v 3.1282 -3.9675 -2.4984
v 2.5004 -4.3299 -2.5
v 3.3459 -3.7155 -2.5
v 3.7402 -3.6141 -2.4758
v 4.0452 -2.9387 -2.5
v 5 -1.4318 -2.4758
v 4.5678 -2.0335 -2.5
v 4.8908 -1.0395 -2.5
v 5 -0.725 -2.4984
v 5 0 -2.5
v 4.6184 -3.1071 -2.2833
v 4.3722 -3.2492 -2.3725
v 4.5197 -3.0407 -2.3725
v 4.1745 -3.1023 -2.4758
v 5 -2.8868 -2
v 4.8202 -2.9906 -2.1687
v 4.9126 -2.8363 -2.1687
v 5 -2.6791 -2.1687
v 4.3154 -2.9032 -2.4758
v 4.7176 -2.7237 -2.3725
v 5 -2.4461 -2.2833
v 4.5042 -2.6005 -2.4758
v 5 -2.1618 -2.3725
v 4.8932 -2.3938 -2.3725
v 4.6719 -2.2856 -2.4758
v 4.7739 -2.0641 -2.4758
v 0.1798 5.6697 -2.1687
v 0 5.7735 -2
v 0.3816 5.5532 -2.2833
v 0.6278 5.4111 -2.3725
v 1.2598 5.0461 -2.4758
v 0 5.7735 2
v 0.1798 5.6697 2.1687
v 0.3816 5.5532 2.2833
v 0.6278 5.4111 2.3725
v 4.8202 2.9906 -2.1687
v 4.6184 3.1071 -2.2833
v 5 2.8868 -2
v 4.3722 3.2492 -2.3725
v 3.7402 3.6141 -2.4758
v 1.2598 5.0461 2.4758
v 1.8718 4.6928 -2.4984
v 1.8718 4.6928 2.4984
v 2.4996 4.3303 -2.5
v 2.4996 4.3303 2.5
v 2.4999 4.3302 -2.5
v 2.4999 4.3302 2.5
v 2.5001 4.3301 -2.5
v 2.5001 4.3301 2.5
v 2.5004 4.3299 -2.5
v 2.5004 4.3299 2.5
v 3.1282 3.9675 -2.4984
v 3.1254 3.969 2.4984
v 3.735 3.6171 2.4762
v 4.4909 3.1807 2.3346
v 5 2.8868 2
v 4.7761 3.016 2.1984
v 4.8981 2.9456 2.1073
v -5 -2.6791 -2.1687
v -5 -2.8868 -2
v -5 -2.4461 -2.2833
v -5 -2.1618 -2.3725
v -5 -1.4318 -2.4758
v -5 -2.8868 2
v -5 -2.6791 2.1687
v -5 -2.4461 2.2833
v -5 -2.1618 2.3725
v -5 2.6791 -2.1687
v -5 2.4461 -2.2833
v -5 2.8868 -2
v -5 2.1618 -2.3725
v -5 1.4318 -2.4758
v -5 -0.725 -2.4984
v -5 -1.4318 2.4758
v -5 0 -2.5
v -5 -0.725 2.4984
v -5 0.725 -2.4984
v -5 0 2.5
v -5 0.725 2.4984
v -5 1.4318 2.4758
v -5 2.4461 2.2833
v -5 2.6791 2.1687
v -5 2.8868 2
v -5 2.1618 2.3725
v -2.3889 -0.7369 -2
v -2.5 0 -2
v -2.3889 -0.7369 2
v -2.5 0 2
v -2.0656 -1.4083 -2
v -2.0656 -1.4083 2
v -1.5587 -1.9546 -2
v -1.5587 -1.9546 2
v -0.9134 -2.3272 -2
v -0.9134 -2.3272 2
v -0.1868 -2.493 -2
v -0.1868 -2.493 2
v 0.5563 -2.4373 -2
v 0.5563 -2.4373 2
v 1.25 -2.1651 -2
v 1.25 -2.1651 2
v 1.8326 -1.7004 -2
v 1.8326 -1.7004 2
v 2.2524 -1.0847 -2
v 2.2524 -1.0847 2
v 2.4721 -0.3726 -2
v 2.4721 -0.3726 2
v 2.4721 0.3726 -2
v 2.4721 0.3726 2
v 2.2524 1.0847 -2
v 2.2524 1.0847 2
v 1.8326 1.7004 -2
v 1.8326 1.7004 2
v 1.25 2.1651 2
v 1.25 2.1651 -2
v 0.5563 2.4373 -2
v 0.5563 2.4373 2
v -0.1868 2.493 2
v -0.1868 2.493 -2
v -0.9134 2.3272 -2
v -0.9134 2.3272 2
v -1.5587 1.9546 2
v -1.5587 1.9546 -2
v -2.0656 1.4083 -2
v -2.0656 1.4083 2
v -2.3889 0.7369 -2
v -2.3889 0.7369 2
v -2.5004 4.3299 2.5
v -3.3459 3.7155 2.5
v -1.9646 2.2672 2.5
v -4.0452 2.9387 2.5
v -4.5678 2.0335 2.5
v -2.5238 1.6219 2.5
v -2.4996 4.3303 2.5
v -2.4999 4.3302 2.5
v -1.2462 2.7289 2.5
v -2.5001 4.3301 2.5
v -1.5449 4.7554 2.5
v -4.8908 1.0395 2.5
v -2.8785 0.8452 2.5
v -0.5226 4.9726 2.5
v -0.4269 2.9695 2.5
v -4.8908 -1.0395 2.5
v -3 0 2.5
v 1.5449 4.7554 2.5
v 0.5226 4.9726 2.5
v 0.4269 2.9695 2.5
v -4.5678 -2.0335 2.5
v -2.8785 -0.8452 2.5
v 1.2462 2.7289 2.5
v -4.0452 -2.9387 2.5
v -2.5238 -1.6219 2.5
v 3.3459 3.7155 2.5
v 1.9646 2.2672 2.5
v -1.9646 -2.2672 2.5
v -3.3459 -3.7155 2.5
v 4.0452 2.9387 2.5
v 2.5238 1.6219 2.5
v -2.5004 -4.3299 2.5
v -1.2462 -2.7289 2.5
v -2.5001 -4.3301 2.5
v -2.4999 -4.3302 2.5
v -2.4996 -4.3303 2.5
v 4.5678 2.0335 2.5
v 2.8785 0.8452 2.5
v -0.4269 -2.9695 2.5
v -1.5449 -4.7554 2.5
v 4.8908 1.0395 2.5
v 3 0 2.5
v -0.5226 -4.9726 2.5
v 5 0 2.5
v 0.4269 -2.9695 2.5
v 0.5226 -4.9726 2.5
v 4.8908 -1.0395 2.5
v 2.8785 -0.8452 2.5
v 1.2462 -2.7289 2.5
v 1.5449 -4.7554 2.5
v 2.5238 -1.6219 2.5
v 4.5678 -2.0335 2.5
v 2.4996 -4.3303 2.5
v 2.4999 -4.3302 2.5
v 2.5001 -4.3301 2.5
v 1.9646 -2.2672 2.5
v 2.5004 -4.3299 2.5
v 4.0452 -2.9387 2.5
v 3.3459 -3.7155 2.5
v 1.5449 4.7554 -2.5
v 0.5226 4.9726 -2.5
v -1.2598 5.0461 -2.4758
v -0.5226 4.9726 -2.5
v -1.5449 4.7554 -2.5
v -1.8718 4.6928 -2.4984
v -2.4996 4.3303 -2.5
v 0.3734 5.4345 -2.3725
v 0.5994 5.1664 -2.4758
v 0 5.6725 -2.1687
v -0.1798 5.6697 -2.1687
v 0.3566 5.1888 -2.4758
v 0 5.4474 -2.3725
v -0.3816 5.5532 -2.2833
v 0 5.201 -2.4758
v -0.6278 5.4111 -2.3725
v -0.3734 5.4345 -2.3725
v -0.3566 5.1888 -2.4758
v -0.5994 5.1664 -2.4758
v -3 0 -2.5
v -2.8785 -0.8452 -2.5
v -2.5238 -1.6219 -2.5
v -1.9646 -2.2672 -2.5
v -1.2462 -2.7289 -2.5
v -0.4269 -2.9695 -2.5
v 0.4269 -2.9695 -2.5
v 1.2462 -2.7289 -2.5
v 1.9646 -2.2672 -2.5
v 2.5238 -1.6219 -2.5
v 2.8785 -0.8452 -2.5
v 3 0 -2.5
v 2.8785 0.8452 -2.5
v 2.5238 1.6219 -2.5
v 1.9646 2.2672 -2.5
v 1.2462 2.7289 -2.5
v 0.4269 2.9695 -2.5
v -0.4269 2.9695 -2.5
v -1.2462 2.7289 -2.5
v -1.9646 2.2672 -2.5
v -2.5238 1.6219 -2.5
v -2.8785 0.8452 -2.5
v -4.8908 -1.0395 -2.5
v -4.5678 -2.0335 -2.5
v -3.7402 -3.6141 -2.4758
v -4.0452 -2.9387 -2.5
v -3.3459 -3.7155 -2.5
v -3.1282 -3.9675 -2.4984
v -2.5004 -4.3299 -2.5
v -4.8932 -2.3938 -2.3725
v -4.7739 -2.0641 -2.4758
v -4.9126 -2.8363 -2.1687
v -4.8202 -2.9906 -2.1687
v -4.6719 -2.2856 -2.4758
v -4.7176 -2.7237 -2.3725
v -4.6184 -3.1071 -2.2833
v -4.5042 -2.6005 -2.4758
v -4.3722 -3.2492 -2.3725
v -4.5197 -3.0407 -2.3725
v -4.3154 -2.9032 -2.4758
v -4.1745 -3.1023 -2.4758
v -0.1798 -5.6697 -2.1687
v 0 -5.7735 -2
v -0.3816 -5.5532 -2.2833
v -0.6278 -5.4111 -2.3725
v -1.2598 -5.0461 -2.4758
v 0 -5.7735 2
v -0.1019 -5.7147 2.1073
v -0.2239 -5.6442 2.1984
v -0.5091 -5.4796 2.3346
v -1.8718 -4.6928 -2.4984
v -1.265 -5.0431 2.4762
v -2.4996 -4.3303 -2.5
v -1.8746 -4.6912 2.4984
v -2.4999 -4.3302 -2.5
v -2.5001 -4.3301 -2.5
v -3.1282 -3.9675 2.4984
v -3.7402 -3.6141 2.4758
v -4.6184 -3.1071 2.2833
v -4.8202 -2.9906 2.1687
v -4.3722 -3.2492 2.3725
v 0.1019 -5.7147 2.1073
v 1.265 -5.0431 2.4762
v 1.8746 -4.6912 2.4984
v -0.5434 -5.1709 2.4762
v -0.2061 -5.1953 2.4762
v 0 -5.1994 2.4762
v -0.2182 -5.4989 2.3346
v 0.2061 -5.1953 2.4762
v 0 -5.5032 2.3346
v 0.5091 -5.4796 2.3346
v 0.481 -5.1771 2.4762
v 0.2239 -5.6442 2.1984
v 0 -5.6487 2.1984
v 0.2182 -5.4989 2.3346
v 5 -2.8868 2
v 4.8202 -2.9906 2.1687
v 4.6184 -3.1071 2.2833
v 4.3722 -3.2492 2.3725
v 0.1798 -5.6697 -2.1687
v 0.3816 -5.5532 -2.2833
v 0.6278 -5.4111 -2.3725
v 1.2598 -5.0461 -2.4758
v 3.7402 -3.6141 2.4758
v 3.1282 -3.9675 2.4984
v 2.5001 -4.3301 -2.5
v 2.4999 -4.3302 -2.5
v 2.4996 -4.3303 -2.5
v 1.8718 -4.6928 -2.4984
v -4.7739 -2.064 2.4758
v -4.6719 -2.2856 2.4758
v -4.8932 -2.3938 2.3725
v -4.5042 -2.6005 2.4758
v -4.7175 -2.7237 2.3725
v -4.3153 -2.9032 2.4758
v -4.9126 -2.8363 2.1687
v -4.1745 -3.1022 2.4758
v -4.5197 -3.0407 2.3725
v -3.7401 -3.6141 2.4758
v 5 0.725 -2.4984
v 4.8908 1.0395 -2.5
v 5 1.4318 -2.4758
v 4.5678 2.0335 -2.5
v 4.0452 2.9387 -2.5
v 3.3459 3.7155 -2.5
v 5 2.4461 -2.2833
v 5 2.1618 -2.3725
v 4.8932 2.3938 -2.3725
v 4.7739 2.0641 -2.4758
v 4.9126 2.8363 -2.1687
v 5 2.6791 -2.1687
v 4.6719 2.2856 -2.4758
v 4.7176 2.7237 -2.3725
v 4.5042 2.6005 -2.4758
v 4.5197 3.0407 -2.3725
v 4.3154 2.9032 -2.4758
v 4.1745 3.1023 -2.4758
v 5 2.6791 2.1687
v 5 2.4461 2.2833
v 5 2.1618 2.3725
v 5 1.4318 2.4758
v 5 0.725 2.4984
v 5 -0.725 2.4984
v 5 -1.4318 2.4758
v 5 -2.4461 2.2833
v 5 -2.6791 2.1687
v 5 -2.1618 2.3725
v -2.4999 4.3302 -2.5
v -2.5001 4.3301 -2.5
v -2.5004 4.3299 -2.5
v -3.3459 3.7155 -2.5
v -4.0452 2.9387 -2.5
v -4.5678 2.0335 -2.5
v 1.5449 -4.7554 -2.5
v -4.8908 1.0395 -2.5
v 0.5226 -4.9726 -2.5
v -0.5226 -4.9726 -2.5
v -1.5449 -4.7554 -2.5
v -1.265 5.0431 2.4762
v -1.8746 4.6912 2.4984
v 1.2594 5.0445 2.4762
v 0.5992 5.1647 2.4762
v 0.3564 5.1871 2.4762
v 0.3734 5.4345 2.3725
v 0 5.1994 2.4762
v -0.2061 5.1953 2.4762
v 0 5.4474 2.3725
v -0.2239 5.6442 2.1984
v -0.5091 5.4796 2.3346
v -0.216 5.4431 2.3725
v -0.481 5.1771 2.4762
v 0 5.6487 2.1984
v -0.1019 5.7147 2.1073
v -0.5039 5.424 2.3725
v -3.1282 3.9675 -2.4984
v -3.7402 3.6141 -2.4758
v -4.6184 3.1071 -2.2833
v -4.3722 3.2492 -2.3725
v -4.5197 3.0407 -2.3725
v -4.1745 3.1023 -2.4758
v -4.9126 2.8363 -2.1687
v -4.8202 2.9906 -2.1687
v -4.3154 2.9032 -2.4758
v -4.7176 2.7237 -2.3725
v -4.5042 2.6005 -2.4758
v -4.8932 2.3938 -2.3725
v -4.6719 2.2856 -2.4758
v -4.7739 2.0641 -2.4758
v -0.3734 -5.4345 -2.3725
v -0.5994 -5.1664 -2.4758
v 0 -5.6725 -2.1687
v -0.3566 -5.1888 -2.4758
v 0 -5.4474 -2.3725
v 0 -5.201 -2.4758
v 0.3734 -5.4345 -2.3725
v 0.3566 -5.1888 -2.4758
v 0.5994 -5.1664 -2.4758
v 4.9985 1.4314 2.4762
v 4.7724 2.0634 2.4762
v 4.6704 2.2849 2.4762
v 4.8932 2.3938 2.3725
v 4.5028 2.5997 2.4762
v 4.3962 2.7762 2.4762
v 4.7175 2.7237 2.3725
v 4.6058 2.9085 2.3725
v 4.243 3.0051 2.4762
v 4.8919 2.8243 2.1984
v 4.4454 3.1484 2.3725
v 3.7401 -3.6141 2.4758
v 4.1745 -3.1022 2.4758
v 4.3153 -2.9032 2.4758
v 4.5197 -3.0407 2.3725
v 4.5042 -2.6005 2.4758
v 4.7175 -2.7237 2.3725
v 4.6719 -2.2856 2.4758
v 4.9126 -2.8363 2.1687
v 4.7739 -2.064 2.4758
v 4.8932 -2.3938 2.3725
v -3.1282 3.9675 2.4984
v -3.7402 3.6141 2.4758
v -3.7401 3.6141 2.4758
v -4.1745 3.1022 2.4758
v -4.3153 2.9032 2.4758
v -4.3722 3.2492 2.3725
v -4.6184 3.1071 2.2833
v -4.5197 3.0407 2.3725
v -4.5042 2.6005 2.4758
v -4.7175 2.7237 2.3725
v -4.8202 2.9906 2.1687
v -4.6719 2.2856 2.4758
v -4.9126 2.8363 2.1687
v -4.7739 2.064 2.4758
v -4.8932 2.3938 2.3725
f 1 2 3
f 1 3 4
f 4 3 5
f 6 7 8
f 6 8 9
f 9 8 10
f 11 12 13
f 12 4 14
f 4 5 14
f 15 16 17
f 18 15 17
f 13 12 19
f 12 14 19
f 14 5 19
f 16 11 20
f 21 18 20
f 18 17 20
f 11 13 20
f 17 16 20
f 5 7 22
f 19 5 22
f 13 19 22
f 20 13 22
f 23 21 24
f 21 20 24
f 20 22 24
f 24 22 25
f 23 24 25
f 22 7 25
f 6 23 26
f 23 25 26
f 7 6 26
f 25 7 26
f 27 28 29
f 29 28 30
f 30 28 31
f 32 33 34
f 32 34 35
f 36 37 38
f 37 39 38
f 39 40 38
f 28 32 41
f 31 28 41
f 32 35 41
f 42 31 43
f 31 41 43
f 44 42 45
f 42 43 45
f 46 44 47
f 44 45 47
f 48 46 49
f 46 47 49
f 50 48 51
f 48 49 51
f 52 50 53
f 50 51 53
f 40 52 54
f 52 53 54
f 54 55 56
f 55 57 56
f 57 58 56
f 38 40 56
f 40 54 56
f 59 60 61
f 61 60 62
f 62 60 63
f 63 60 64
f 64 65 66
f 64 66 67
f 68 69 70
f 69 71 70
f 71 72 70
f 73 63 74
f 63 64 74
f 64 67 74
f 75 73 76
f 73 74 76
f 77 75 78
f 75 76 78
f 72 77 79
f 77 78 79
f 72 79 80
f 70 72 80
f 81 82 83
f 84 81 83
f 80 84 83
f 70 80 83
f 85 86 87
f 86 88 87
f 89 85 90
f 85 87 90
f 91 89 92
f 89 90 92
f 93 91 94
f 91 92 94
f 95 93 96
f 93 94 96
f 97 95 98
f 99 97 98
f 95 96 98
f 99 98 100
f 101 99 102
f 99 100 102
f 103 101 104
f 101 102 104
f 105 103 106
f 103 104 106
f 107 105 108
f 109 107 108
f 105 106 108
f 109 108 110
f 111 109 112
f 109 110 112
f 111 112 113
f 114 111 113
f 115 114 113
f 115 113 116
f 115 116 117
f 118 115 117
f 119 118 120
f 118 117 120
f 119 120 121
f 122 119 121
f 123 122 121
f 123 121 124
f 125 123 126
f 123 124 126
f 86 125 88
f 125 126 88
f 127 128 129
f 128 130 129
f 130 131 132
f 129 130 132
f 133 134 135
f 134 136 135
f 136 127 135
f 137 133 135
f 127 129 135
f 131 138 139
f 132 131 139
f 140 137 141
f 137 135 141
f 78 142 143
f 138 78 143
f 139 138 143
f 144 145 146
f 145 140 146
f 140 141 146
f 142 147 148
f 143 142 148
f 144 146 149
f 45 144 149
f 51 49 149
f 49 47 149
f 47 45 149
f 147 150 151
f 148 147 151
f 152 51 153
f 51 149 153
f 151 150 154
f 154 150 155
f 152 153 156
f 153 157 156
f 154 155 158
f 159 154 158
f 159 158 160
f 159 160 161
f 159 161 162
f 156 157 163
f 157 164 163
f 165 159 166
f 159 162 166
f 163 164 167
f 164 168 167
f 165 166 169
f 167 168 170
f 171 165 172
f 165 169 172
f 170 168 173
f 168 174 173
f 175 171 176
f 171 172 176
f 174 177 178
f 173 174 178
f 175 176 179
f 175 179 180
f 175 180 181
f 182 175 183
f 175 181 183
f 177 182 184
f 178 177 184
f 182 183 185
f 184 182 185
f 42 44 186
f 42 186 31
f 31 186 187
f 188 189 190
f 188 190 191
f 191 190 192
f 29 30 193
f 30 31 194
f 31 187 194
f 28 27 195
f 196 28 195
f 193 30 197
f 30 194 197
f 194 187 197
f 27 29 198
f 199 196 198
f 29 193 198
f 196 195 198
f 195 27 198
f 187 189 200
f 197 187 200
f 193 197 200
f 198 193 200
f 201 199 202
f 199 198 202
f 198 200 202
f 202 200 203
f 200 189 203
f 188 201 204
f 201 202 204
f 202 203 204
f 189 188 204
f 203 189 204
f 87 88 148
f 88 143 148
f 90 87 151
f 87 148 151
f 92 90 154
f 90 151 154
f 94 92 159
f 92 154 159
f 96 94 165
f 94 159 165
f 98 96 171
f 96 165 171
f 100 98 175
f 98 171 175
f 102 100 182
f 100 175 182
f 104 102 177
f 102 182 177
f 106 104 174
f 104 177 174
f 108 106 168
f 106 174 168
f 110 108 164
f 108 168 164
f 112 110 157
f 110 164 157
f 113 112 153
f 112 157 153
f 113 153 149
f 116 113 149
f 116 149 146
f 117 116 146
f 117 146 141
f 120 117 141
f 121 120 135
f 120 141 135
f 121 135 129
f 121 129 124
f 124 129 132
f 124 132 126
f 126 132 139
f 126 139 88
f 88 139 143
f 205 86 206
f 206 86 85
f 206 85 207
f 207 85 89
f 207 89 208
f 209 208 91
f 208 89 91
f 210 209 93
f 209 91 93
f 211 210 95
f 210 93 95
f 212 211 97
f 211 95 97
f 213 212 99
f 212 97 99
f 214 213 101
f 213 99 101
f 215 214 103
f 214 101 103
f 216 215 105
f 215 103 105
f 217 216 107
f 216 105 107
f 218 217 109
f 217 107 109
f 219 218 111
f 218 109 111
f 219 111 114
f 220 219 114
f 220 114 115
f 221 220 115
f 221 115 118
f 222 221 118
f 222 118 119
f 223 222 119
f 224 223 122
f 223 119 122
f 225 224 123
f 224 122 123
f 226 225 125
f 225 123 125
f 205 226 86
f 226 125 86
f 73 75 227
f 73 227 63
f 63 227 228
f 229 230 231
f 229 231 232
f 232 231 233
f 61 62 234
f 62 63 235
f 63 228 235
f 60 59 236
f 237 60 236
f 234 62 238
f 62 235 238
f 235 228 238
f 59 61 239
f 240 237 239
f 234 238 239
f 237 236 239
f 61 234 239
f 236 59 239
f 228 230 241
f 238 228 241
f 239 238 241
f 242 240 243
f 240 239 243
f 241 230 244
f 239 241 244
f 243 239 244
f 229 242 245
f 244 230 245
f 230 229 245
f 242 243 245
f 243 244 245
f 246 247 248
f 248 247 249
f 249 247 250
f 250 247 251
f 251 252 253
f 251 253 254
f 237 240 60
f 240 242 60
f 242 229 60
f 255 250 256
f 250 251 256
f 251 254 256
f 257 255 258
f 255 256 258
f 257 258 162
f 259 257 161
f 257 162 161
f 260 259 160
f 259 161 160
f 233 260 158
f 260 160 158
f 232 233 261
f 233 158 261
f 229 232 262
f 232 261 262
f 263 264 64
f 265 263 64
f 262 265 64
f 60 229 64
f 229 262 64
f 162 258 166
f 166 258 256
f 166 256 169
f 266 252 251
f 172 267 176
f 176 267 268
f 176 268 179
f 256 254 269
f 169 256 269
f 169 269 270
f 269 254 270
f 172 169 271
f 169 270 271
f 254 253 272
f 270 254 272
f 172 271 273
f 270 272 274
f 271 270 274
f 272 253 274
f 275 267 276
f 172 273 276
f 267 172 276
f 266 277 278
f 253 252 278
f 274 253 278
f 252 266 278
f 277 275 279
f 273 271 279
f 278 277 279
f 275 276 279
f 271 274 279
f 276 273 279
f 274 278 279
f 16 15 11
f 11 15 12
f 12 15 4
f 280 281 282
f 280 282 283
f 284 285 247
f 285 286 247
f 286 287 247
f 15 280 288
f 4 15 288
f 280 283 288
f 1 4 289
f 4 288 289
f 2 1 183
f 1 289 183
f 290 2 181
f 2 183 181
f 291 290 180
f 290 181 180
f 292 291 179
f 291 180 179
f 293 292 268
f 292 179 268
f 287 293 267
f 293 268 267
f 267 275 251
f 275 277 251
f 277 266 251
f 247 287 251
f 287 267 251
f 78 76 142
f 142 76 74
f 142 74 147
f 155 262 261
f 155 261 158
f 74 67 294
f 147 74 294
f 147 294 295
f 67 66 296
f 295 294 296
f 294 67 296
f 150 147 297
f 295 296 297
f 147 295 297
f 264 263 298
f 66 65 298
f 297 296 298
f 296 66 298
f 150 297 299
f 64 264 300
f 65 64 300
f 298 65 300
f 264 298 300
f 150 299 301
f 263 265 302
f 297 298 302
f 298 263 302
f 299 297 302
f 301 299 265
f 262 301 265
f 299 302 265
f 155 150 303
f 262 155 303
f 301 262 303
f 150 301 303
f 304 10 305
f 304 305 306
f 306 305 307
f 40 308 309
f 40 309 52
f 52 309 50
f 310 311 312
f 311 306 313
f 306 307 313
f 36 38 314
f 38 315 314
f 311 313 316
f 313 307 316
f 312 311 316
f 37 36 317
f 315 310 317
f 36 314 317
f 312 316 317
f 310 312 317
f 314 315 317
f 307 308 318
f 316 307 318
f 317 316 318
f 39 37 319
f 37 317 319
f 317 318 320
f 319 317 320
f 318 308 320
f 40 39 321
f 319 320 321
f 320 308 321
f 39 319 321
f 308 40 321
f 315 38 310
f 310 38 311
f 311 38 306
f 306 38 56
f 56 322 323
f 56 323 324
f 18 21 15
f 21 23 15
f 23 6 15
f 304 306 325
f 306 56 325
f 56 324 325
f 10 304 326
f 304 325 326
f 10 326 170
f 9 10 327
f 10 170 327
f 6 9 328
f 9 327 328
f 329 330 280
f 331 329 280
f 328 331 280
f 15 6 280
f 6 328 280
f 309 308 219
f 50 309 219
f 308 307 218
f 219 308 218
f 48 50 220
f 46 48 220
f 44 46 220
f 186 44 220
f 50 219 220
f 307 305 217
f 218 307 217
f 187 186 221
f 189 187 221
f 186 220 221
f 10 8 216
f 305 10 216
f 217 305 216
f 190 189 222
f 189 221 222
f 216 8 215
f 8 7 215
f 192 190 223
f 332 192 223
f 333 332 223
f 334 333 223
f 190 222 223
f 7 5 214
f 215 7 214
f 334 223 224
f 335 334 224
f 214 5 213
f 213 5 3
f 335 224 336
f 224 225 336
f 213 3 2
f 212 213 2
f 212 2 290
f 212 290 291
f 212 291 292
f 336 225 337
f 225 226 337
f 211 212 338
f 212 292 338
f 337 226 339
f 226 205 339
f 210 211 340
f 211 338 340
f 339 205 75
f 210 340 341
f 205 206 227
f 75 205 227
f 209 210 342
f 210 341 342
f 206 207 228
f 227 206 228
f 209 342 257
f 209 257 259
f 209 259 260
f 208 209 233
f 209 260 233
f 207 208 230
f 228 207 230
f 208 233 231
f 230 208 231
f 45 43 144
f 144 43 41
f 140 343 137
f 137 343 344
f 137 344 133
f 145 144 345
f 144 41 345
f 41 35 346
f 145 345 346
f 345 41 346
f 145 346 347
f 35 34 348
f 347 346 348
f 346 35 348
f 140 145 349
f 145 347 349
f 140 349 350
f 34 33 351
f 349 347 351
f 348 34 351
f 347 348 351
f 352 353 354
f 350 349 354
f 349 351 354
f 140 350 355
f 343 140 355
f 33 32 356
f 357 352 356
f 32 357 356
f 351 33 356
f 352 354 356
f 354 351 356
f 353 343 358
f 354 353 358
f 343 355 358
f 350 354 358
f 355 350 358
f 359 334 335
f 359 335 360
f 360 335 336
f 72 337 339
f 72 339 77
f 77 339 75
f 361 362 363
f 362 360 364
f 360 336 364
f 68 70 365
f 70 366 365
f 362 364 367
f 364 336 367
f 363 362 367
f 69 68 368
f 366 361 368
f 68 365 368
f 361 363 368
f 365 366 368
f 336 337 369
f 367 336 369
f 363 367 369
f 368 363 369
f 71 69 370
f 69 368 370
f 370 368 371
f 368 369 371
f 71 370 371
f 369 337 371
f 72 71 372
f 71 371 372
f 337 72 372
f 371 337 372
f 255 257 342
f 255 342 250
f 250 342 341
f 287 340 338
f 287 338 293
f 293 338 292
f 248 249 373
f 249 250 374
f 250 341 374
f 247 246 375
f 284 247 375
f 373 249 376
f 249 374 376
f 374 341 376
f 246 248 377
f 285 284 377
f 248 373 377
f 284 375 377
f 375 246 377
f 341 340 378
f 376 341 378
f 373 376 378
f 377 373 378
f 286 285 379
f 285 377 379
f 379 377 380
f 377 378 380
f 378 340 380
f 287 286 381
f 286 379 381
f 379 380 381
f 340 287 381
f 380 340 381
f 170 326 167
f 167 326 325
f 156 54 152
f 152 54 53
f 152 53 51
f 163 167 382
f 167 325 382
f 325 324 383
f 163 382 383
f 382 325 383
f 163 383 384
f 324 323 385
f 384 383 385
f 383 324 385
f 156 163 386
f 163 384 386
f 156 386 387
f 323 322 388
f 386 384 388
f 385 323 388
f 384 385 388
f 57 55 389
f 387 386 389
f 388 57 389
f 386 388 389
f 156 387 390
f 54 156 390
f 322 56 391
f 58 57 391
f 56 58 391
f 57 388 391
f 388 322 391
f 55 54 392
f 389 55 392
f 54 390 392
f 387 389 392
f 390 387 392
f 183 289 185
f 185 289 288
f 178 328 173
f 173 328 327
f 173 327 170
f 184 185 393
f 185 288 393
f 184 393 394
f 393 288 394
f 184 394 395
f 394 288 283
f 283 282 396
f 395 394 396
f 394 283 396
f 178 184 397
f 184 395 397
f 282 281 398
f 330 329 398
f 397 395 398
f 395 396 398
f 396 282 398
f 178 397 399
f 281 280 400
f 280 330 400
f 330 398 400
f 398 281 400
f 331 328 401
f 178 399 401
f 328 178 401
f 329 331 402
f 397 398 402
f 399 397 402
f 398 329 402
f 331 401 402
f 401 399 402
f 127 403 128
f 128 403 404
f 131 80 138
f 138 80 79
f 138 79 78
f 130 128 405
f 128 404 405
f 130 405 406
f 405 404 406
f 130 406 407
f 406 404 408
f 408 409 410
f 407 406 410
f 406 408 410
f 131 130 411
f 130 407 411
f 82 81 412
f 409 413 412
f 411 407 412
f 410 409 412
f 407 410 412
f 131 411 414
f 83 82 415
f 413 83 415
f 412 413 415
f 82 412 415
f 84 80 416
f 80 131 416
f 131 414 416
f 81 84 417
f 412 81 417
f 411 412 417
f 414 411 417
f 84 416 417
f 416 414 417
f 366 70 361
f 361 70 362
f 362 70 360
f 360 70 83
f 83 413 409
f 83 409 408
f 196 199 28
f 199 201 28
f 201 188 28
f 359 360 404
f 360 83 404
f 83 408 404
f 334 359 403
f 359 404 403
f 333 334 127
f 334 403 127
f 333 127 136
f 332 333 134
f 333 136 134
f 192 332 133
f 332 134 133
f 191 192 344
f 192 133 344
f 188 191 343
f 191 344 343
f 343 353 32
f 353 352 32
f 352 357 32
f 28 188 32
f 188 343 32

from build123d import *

# Parameters (mm, degrees)
F2_R     = 6.562274
F3_DEPTH = 12.5


with BuildPart() as f1:
    # F0 (on Front) → F1 (revolve)
    with BuildSketch(Plane.XZ):
        with BuildLine():
            Line((-2.5, -2), (-2.5, 0))
            Line((-2.5, 0), (-2.5, 2))
            Line((-2.5, 2), (-3, 2.5))
            Line((-3, 2.5), (-5, 2.5))
            ThreePointArc((-5, 2.5), (-5.460518, 2.364117), (-5.773503, 2))
            Line((-5.773503, 2), (-5.773503, 0))
            Line((-5.773503, 0), (-5.773503, -2))
            ThreePointArc((-5.773503, -2), (-5.460518, -2.364117), (-5, -2.5))
            Line((-5, -2.5), (-3, -2.5))
            Line((-3, -2.5), (-2.5, -2))
        make_face()
    revolve(axis=Axis((0, 0, 4.430122), (0, 0, 1)))

    # F2 (on Top) → F3 (cut, symmetric)
    with BuildSketch(Plane.XY):
        Circle(F2_R)
        Polygon((0, 5.773503), (5, 2.886751), (5, -2.886751), (0, -5.773503), (-5, -2.886751), (-5, 2.886751), align=None, mode=Mode.SUBTRACT)
    extrude(amount=F3_DEPTH, both=True, mode=Mode.SUBTRACT)


solid = f1.part
